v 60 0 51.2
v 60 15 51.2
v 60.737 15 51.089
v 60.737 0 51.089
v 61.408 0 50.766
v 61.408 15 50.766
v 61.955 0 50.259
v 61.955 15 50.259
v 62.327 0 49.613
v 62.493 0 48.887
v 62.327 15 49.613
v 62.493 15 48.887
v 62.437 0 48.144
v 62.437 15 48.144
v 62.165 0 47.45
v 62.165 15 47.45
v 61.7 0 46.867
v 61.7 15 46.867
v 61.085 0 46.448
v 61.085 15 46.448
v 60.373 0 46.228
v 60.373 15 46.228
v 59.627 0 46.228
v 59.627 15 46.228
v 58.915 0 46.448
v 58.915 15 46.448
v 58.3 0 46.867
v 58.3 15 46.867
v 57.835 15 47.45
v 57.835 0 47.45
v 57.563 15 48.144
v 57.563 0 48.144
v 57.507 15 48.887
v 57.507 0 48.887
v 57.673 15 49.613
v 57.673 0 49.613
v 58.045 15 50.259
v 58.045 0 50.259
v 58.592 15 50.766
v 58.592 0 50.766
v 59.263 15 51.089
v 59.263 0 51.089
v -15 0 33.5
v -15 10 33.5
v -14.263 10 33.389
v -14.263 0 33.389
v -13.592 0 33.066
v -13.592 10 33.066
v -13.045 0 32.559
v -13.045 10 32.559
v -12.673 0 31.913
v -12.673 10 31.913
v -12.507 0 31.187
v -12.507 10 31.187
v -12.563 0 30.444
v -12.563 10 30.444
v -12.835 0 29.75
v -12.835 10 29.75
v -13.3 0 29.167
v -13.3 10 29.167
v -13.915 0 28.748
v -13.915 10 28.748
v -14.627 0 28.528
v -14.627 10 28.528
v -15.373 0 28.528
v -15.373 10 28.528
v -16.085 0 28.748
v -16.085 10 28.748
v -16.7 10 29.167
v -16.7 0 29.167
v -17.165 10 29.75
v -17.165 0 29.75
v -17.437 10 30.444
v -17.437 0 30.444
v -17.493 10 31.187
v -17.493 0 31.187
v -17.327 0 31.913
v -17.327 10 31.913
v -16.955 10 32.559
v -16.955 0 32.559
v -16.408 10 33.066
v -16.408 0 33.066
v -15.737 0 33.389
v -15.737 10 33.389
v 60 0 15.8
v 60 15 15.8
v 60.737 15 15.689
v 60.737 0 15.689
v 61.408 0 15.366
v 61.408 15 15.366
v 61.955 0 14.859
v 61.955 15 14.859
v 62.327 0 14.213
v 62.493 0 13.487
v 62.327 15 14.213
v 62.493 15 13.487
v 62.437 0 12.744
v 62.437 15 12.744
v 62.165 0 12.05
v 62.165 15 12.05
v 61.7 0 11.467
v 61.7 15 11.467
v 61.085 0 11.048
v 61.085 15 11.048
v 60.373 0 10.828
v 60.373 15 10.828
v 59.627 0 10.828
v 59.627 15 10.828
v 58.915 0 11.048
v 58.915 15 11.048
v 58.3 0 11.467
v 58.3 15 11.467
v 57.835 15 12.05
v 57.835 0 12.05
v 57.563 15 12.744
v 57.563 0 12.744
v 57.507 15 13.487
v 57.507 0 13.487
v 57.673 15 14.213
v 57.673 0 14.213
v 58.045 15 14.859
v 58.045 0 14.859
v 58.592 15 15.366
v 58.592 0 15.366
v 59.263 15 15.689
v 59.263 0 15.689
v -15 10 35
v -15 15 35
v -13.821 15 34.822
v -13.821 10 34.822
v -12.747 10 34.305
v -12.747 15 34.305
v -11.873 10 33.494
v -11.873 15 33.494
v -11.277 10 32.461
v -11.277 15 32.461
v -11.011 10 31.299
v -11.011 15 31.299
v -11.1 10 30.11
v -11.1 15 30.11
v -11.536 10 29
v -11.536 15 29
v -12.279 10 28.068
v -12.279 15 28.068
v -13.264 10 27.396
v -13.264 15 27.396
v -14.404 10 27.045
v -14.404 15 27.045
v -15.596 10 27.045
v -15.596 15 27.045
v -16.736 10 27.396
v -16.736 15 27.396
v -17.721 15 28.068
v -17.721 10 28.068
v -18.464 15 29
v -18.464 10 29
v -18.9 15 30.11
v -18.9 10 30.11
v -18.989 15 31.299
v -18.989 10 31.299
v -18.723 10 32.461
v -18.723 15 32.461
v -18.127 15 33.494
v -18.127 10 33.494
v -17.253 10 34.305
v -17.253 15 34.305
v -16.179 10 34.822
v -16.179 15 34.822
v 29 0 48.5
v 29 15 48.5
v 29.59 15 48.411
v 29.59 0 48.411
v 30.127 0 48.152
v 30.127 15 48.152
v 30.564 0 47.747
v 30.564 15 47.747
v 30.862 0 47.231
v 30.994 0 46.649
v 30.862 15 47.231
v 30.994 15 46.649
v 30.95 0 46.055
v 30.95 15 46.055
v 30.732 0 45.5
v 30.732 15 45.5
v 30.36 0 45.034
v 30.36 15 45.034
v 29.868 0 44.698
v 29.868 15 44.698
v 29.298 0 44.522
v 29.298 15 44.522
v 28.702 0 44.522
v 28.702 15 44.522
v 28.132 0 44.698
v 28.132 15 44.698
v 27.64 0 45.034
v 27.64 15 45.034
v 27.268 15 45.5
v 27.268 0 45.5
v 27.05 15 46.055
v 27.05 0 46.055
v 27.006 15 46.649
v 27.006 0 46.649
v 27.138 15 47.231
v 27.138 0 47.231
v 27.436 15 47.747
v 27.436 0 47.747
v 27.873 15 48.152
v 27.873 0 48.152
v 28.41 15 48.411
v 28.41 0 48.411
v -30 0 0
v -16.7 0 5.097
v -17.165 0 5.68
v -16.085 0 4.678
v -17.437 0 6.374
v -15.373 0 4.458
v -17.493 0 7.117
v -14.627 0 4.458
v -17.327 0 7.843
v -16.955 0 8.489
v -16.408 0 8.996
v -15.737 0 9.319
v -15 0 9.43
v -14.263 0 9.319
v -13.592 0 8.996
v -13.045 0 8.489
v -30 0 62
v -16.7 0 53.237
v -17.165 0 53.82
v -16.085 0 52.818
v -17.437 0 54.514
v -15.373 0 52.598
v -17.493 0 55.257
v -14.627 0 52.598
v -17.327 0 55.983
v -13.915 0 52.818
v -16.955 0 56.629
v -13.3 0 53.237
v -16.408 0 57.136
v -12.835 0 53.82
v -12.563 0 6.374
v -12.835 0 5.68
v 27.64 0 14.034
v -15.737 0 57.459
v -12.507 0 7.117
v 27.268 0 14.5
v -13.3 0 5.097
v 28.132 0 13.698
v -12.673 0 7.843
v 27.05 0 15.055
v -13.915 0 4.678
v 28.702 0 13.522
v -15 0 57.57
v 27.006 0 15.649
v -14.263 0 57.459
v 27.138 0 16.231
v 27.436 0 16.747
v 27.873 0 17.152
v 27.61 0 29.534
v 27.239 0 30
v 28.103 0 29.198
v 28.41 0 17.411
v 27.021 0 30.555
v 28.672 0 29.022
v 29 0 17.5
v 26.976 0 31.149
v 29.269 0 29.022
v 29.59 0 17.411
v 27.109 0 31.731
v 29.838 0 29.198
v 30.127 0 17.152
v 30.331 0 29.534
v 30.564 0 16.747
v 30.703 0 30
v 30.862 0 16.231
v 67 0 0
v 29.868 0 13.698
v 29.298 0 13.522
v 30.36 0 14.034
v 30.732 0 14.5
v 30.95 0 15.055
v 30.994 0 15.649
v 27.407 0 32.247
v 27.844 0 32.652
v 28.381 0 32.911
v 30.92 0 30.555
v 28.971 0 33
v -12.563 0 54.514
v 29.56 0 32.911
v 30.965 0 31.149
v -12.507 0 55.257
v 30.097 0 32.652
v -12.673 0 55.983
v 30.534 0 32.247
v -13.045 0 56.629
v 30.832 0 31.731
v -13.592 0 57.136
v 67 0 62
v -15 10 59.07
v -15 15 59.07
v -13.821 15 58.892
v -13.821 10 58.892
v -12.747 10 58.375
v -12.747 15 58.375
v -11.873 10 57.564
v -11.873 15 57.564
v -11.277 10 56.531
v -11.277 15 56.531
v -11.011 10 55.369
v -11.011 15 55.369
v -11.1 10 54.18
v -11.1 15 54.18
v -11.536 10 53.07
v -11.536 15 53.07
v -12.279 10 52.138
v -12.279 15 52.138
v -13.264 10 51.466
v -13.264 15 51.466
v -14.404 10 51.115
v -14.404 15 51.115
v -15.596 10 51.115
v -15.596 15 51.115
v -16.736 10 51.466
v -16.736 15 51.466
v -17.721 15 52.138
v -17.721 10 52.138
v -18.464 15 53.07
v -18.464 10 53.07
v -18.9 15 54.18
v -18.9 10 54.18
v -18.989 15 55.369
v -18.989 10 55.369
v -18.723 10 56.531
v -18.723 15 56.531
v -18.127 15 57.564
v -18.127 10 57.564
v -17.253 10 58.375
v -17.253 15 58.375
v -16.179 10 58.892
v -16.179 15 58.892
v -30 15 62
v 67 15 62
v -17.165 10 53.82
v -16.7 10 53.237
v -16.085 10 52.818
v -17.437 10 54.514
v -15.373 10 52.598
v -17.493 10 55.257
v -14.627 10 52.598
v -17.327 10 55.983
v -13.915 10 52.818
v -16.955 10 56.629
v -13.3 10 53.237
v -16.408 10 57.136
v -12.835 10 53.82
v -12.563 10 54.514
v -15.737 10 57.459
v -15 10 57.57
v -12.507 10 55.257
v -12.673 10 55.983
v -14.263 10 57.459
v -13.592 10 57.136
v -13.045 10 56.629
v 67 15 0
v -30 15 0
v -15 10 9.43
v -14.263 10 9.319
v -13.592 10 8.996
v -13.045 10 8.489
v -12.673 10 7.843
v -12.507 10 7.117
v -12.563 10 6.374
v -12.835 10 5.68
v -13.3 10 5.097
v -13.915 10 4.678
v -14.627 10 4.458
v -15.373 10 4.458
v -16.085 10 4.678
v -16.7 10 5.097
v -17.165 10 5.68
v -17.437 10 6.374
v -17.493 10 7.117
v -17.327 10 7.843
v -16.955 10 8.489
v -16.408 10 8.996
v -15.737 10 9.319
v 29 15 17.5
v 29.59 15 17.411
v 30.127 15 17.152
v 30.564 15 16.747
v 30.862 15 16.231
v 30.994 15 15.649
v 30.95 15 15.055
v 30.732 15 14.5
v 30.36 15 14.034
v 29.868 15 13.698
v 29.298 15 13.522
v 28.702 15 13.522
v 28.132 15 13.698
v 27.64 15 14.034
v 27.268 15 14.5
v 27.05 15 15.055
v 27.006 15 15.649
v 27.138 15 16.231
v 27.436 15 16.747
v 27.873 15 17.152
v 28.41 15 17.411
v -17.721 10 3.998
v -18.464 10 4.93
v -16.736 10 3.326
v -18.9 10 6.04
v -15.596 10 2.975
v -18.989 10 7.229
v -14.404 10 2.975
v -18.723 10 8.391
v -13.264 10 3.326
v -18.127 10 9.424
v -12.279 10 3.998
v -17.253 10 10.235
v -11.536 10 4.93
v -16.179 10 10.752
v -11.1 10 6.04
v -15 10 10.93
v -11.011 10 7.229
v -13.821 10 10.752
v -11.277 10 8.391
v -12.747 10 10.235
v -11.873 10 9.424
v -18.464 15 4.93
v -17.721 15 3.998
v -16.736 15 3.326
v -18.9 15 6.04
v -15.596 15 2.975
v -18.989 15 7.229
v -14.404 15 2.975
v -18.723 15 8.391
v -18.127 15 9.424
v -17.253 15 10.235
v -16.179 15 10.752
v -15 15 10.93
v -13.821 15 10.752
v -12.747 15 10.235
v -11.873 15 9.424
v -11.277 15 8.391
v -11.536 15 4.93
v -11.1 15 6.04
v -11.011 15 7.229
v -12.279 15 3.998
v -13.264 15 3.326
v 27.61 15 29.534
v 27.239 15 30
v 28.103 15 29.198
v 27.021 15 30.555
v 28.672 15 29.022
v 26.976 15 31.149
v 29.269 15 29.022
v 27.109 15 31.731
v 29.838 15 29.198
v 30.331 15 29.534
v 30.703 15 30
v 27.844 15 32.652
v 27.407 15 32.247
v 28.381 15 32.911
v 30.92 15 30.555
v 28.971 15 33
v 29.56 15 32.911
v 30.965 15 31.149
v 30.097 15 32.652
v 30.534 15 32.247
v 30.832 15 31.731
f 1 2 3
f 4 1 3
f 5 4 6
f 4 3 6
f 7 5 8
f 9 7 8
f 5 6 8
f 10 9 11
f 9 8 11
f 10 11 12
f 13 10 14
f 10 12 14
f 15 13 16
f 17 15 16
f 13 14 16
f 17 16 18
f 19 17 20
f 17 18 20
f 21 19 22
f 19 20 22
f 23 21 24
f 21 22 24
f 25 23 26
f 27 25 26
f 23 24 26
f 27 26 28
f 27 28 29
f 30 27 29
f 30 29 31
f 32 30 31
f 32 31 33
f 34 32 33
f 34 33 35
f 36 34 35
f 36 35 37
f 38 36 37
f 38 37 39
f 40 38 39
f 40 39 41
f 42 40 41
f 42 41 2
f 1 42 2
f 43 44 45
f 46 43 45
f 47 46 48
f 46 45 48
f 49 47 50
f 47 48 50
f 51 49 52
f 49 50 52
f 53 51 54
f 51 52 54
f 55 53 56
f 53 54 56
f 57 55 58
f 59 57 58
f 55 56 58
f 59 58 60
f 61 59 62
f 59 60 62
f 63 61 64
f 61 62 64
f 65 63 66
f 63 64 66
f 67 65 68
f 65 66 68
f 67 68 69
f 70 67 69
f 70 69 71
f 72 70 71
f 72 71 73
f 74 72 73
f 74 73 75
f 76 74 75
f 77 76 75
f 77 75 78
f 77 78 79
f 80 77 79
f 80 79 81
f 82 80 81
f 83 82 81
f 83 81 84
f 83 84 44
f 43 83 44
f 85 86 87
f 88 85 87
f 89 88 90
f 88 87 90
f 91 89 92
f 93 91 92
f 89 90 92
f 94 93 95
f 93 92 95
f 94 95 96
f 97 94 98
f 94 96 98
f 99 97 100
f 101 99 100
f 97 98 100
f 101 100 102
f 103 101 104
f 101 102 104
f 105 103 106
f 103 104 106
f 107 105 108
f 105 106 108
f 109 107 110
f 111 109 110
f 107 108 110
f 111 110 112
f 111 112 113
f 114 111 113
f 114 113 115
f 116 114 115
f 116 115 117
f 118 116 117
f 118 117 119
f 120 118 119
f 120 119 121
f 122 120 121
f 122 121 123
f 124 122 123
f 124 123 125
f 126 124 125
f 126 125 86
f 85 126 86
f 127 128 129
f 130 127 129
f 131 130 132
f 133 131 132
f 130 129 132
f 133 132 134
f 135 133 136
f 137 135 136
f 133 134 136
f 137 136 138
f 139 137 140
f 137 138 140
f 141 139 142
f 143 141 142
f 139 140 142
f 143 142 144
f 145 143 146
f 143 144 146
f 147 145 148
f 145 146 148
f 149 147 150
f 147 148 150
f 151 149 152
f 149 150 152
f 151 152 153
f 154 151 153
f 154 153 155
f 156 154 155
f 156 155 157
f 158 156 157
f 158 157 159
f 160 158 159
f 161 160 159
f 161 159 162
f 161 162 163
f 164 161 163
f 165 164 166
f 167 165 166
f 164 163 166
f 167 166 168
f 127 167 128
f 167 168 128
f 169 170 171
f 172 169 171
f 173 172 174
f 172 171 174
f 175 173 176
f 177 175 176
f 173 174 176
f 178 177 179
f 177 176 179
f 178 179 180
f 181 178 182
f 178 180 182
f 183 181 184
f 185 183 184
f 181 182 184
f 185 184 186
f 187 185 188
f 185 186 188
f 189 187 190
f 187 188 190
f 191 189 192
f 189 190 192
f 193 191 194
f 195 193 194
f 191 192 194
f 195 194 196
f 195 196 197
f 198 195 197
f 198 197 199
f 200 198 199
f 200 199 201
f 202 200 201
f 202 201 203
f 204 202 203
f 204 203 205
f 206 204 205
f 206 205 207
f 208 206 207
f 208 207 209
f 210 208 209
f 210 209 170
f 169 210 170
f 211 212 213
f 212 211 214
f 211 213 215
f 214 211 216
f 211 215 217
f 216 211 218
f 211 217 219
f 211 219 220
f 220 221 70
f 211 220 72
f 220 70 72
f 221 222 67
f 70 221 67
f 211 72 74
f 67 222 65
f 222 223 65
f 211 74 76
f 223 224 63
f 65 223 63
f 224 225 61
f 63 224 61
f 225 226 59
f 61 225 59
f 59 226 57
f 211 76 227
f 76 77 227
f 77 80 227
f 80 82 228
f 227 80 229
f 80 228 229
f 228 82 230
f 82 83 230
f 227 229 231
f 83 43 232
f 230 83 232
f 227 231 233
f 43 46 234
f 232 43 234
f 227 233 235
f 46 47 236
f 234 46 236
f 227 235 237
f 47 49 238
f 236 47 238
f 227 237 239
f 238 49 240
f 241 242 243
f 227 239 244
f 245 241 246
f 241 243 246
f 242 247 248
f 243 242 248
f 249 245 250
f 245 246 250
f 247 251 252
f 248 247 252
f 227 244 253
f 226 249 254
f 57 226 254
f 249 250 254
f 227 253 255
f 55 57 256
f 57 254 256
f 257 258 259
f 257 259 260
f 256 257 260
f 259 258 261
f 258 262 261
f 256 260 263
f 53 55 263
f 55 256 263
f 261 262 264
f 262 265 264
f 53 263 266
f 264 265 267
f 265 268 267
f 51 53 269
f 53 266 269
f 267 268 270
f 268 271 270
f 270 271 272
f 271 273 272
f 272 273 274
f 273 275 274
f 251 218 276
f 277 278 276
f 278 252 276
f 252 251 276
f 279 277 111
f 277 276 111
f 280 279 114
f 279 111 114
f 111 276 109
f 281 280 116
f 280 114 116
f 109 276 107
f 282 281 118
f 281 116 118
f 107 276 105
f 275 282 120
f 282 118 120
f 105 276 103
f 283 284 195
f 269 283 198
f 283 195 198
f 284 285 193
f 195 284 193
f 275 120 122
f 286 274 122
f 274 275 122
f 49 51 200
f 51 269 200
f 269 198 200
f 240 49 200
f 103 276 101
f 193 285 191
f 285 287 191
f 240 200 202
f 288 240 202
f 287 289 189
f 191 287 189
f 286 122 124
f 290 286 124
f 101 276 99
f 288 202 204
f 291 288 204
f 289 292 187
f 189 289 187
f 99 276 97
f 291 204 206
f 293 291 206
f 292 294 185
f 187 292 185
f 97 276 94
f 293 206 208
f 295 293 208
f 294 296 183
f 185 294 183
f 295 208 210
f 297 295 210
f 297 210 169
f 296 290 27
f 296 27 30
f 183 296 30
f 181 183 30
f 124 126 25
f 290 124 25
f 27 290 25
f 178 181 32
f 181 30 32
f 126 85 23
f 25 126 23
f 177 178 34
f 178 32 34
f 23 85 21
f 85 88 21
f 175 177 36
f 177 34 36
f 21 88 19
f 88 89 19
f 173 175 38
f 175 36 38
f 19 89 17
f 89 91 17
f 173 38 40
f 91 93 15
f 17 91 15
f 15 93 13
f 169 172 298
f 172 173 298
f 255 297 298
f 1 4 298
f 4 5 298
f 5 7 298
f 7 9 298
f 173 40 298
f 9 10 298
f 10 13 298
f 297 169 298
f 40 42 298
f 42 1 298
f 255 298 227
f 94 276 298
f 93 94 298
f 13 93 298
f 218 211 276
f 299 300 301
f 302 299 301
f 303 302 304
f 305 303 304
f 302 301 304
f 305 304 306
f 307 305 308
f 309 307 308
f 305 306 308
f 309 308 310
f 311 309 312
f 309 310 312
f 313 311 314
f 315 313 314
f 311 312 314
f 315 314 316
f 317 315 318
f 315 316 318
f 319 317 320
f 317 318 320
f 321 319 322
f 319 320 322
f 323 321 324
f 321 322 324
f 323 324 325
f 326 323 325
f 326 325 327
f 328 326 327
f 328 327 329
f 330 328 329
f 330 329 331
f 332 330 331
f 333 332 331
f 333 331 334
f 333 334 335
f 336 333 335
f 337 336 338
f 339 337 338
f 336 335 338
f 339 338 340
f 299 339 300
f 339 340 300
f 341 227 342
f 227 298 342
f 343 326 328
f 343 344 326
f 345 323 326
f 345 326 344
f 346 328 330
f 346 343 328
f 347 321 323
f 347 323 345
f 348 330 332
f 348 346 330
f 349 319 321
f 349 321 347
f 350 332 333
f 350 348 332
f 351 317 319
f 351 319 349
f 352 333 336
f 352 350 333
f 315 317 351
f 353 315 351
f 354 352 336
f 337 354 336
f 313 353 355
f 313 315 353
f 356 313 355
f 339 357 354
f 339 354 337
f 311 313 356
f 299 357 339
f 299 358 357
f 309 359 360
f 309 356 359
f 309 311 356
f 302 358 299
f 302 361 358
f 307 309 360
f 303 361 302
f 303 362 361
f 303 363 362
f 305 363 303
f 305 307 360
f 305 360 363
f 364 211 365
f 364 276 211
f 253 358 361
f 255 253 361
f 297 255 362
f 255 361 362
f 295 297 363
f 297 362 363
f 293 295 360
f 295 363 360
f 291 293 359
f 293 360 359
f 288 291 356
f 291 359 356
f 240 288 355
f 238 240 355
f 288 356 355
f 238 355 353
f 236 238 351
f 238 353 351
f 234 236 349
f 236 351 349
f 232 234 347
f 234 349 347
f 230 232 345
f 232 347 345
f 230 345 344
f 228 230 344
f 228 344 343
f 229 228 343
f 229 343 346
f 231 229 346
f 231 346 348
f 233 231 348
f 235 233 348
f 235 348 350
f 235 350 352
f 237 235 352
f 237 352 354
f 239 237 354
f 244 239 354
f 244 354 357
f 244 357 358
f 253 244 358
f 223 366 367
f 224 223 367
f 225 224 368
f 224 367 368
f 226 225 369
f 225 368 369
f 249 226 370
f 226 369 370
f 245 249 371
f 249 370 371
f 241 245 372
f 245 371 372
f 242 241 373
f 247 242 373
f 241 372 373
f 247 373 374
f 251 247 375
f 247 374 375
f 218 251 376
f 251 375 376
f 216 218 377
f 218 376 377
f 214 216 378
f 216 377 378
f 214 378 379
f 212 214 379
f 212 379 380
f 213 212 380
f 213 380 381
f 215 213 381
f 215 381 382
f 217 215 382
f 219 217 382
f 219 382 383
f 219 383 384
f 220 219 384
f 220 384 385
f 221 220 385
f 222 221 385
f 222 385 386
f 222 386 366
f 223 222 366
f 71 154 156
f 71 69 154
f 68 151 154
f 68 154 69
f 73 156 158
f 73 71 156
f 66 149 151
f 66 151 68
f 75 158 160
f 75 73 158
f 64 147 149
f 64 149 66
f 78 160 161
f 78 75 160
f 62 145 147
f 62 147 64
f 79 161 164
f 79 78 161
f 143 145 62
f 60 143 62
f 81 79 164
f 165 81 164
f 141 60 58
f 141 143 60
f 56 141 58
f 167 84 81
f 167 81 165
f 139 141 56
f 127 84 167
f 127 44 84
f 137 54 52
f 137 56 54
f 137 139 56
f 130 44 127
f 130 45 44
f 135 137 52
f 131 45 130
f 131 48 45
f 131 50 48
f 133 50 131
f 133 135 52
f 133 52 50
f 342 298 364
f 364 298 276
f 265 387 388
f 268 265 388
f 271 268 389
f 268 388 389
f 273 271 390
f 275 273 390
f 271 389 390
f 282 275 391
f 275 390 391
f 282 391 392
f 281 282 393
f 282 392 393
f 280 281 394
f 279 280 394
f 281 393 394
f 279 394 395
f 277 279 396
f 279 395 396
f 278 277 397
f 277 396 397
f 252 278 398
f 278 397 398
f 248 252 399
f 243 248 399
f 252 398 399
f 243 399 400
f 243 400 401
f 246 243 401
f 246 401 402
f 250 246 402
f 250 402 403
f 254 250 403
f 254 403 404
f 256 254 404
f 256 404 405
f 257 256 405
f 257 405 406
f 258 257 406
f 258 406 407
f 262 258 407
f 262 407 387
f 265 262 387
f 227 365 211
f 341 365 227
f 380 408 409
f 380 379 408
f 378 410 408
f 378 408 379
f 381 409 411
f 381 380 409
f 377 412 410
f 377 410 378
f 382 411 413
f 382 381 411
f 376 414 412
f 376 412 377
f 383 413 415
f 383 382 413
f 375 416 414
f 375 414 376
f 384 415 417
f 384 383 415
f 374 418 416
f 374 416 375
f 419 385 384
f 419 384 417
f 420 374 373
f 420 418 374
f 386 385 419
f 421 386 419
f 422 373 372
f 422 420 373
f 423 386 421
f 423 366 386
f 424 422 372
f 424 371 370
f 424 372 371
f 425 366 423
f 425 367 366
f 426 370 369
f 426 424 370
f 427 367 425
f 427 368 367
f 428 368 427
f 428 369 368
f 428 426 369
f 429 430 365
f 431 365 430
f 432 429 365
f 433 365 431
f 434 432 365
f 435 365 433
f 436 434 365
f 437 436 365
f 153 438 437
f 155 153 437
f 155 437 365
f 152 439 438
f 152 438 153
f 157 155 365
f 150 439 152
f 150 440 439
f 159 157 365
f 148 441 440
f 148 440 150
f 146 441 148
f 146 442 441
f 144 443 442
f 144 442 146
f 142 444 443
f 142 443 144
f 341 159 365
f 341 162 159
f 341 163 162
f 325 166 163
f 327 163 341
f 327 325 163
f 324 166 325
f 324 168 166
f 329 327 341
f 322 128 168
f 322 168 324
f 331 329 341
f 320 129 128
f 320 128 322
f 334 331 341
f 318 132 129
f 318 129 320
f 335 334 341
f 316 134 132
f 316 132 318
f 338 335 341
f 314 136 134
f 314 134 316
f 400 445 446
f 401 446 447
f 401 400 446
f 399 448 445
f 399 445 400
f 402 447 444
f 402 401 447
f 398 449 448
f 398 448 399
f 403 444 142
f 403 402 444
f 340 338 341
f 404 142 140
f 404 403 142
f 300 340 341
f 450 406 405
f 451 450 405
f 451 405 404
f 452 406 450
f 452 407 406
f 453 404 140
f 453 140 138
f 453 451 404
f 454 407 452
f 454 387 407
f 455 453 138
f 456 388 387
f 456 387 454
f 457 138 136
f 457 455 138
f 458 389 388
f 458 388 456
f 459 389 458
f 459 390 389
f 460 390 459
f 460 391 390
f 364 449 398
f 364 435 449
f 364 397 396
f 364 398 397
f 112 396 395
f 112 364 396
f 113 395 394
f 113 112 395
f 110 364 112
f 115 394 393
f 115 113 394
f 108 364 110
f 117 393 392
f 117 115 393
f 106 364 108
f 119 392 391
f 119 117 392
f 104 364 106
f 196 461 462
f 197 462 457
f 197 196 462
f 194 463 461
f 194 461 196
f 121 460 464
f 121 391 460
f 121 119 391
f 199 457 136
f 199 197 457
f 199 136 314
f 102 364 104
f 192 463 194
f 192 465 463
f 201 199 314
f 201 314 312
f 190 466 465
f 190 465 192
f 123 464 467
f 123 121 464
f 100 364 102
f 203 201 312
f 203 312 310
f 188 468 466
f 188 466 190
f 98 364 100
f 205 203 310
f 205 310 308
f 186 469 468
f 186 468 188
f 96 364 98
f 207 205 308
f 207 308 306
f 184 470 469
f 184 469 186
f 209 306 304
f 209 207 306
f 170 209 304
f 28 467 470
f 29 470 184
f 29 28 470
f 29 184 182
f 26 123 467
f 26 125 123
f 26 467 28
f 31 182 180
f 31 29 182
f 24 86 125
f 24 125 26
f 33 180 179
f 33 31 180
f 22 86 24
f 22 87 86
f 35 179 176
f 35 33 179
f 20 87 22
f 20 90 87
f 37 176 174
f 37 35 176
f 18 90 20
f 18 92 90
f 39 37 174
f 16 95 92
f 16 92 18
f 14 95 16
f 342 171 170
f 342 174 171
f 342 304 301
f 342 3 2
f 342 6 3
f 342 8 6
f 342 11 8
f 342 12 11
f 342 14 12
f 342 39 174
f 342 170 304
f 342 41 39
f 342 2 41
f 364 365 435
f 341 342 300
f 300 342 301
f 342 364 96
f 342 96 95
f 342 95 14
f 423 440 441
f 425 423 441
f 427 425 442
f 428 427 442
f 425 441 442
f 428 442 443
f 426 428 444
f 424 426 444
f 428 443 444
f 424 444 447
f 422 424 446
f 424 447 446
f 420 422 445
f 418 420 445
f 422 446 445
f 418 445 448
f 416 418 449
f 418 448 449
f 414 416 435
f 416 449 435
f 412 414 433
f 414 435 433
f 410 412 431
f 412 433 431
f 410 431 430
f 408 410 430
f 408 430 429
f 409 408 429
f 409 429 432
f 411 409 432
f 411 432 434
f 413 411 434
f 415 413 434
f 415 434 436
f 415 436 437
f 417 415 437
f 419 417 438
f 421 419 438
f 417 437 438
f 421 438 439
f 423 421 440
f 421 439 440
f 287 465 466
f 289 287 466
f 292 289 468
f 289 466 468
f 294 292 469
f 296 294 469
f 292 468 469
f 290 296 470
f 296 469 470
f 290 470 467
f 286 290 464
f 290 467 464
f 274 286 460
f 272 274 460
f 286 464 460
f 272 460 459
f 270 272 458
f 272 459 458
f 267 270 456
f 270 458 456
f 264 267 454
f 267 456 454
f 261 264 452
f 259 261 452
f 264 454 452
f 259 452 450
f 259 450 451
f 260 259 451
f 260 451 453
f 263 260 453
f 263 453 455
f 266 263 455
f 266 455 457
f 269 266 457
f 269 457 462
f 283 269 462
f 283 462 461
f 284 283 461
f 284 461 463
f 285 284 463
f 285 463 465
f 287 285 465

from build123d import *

# Parameters (mm, degrees)
ESBO_O1_W                = 67
ESBO_O1_H                = 62
RESSALTO_EXTRUS_O1_DEPTH = 15
ESBO_O2_R                = 2.5
ESBO_O2_R_2              = 2
CORTE_EXTRUS_O1_DEPTH    = 93.509458976
ESBO_O3_W                = 62
ESBO_O3_H                = 15
RESSALTO_EXTRUS_O2_DEPTH = 30
ESBO_O4_R                = 2.5
CORTE_EXTRUS_O2_DEPTH    = 93.509458976
ESBO_O5_R                = 4
CORTE_EXTRUS_O3_DEPTH    = 5


with BuildPart() as part:
    # Esboço1 → Ressalto-extrusão1 (new body)
    with BuildSketch(Plane(origin=(0, 0, 0), x_dir=(1, 0, 0), z_dir=(0, 1, 0))):
        with Locations((33.5, -31)):
            Rectangle(ESBO_O1_W, ESBO_O1_H)
    extrude(amount=RESSALTO_EXTRUS_O1_DEPTH)

    # Esboço2 → Corte-extrusão1 (cut, through all)
    with BuildSketch(Plane(origin=(0, 15, 0), x_dir=(1, 0, 0), z_dir=(0, 1, 0))):
        with Locations(Location((60, -13.3, 0), (0, 0, 270))):
            Circle(ESBO_O2_R)
        with Locations(Location((60, -48.7, 0), (0, 0, 270))):
            Circle(ESBO_O2_R)
        with Locations(Location((29, -46.5, 0), (0, 0, 270))):
            Circle(ESBO_O2_R_2)
        with Locations(Location((28.970556633, -31, 0), (0, 0, 270))):
            Circle(ESBO_O2_R_2)
        with Locations(Location((29, -15.5, 0), (0, 0, 270))):
            Circle(ESBO_O2_R_2)
    extrude(amount=-CORTE_EXTRUS_O1_DEPTH, mode=Mode.SUBTRACT)

    # Esboço3 → Ressalto-extrusão2 (add)
    with BuildSketch(Plane.ZY):
        with Locations((31, 7.5)):
            Rectangle(ESBO_O3_W, ESBO_O3_H)
    extrude(amount=RESSALTO_EXTRUS_O2_DEPTH)

    # Esboço4 → Corte-extrusão2 (cut, through all)
    with BuildSketch(Plane(origin=(0, 15, 0), x_dir=(1, 0, 0), z_dir=(0, 1, 0))):
        with Locations(Location((-15, -31, 0), (0, 0, 270))):
            Circle(ESBO_O4_R)
        with Locations(Location((-15, -6.93, 0), (0, 0, 270))):
            Circle(ESBO_O4_R)
        with Locations(Location((-15, -55.07, 0), (0, 0, 270))):
            Circle(ESBO_O4_R)
    extrude(amount=-CORTE_EXTRUS_O2_DEPTH, mode=Mode.SUBTRACT)

    # Esboço5 → Corte-extrusão3 (cut)
    with BuildSketch(Plane(origin=(0, 15, 0), x_dir=(1, 0, 0), z_dir=(0, 1, 0))):
        with Locations(Location((-15, -6.93, 0), (0, 0, 270))):
            Circle(ESBO_O5_R)
        with Locations(Location((-15, -31, 0), (0, 0, 270))):
            Circle(ESBO_O5_R)
        with Locations(Location((-15, -55.07, 0), (0, 0, 270))):
            Circle(ESBO_O5_R)
    extrude(amount=-CORTE_EXTRUS_O3_DEPTH, mode=Mode.SUBTRACT)


solid = part.part
